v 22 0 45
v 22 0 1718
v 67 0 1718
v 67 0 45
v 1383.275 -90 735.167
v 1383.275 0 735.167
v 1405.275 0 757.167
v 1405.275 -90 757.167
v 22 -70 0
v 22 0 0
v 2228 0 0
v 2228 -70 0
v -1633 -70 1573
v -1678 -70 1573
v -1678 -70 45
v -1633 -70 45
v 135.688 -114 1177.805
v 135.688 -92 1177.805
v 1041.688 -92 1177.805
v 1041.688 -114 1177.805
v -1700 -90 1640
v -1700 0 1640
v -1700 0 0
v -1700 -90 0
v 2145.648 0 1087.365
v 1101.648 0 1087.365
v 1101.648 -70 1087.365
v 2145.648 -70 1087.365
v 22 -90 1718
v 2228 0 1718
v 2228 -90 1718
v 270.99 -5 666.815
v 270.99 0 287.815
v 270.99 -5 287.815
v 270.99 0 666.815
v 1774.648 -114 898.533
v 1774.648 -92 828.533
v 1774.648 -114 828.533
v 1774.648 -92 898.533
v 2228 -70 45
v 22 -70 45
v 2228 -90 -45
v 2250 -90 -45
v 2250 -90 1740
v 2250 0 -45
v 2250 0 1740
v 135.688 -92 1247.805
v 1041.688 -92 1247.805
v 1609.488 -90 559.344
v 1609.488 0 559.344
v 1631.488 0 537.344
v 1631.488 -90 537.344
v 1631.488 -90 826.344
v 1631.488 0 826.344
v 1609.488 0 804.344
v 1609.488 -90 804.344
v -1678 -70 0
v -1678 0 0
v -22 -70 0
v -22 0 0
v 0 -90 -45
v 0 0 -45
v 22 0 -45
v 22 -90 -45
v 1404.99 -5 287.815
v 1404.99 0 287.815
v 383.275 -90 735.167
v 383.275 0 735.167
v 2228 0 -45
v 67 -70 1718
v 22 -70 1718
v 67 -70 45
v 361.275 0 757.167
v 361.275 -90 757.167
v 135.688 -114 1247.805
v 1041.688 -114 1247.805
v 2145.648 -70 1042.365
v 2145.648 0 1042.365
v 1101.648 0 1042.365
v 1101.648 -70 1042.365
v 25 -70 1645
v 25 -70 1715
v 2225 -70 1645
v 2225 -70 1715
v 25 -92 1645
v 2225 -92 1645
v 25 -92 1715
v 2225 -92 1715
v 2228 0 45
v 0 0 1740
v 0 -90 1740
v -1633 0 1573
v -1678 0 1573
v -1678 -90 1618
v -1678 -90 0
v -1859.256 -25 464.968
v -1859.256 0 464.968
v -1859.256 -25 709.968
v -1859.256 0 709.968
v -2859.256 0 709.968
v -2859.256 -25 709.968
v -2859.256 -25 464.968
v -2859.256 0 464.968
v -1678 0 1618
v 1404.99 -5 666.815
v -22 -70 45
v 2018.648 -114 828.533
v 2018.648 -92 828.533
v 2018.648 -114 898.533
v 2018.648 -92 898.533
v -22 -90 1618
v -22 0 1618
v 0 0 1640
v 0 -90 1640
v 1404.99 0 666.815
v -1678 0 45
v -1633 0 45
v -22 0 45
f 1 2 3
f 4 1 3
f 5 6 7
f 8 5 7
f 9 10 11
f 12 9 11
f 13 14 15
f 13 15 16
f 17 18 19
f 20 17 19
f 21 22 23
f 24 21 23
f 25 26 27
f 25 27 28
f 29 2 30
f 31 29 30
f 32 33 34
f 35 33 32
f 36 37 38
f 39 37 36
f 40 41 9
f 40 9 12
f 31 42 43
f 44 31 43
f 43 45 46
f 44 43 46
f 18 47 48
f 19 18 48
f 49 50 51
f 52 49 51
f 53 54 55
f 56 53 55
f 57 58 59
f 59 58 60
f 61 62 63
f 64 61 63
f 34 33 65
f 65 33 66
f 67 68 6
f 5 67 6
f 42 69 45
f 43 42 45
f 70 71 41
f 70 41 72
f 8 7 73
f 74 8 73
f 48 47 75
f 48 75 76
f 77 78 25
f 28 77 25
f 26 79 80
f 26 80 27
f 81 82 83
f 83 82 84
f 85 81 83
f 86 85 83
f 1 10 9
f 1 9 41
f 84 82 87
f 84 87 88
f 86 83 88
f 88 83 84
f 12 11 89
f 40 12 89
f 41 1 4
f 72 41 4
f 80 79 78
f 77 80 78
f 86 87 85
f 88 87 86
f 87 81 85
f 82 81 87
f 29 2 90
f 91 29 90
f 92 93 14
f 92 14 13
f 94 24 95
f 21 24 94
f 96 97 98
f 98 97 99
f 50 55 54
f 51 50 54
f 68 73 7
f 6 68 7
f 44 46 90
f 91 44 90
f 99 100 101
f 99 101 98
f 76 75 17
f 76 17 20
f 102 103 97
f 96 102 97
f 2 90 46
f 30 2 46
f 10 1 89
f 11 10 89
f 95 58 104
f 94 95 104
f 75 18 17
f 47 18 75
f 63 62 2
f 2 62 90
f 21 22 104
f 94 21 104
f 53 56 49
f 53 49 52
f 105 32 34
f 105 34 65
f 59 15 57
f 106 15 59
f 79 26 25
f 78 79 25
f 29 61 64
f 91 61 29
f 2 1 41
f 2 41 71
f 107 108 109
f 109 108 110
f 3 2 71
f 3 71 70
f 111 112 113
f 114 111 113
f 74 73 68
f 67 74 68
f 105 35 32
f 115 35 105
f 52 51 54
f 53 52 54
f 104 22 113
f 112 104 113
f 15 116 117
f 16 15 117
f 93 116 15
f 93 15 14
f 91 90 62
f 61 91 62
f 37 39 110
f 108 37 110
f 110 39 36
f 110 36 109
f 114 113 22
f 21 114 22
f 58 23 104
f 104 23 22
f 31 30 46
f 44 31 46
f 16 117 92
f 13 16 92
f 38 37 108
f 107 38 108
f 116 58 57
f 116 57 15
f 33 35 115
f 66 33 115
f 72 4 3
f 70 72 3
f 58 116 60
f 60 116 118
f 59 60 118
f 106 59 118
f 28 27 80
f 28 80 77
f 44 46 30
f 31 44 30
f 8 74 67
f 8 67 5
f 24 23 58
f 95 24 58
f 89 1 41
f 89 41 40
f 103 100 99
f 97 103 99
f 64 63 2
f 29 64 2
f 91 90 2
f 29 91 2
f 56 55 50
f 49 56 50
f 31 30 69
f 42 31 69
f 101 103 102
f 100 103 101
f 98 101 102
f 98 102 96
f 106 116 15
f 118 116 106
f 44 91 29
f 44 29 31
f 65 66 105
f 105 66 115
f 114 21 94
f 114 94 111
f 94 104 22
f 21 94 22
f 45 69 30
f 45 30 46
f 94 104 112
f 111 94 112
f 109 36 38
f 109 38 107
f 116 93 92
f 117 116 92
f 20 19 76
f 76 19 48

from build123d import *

# Parameters (mm, degrees)
F1_W      = 2206
F1_H      = 45
F2_DEPTH  = 70
F3_W      = 45
F3_H      = 1673
F4_DEPTH  = 70
F6_DEPTH  = 90
F8_DEPTH  = 90
F10_DEPTH = 90
F11_W     = 2200
F11_H     = 70
F12_DEPTH = 22
F13_W     = 1044
F13_H     = 45
F14_DEPTH = 70
F15_W     = 906
F15_H     = 70
F16_DEPTH = 22
F17_W     = 244
F17_H     = 70
F18_DEPTH = 22
F20_DEPTH = 90
F22_DEPTH = 90
F23_W     = 1134
F23_H     = 379
F24_DEPTH = 5
F25_W     = 1000
F25_H     = 245
F26_DEPTH = 25
F27_W     = 1656
F27_H     = 45
F28_DEPTH = 70
F29_W     = 45
F29_H     = 1528
F30_DEPTH = 70
F32_DEPTH = 90
F34_DEPTH = 90


with BuildPart() as f2:
    # F1 (on face) → F2 (new body)
    with BuildSketch(Plane.XZ):
        with Locations((1125, 22.5)):
            Rectangle(F1_W, F1_H)
    extrude(amount=F2_DEPTH)


with BuildPart() as f4:
    # F3 (on face) → F4 (new body)
    with BuildSketch(Plane.XZ):
        with Locations((44.5, 881.5)):
            Rectangle(F3_W, F3_H)
    extrude(amount=F4_DEPTH)


with BuildPart() as f6:
    # F5 (on face) → F6 (new body)
    with BuildSketch(Plane.XZ):
        Polygon((2250, 1740), (0, 1740), (22, 1718), (2228, 1718), align=None)
    extrude(amount=F6_DEPTH)


with BuildPart() as f8:
    # F7 (on face) → F8 (new body)
    with BuildSketch(Plane.XZ):
        Polygon((2250, -45), (2250, 1740), (2228, 1718), (2228, -45), align=None)
    extrude(amount=F8_DEPTH)


with BuildPart() as f10:
    # F9 (on face) → F10 (new body)
    with BuildSketch(Plane.XZ):
        Polygon((22, 1718), (0, 1740), (0, -45), (22, -45), align=None)
    extrude(amount=F10_DEPTH)


with BuildPart() as f12:
    # F11 (on face) → F12 (new body)
    with BuildSketch(Plane.XZ.offset(70)):
        with Locations((1125, 1680)):
            Rectangle(F11_W, F11_H)
    extrude(amount=F12_DEPTH)


with BuildPart() as f14:
    # F13 (on face) → F14 (new body)
    with BuildSketch(Plane.XZ):
        with Locations((1623.64778, 1064.865232)):
            Rectangle(F13_W, F13_H)
    extrude(amount=F14_DEPTH)


with BuildPart() as f16:
    # F15 (on face) → F16 (new body)
    with BuildSketch(Plane.XZ.offset(92)):
        with Locations((588.688204, 1212.805476)):
            Rectangle(F15_W, F15_H)
    extrude(amount=F16_DEPTH)


with BuildPart() as f18:
    # F17 (on face) → F18 (new body)
    with BuildSketch(Plane.XZ.offset(92)):
        with Locations((1896.647818, 863.533348)):
            Rectangle(F17_W, F17_H)
    extrude(amount=F18_DEPTH)


with BuildPart() as f20:
    # F19 (on face) → F20 (new body)
    with BuildSketch(Plane.XZ):
        Polygon((1631.487687, 537.344146), (1631.487687, 826.344146), (1609.487687, 804.344146), (1609.487687, 559.344146), align=None)
    extrude(amount=F20_DEPTH)


with BuildPart() as f22:
    # F21 (on face) → F22 (new body)
    with BuildSketch(Plane.XZ):
        Polygon((1405.275234, 757.167445), (361.275234, 757.167445), (383.275234, 735.167445), (1383.275234, 735.167445), align=None)
    extrude(amount=F22_DEPTH)


with BuildPart() as f24:
    # F23 (on face) → F24 (new body)
    with BuildSketch(Plane.XZ):
        with Locations((837.989956, 477.315173)):
            Rectangle(F23_W, F23_H)
    extrude(amount=F24_DEPTH)


with BuildPart() as f26:
    # F25 (on face) → F26 (new body)
    with BuildSketch(Plane.XZ):
        with Locations((-2359.25585, 587.467998)):
            Rectangle(F25_W, F25_H)
    extrude(amount=F26_DEPTH)


with BuildPart() as f28:
    # F27 (on face) → F28 (new body)
    with BuildSketch(Plane.XZ):
        with Locations((-850, 22.5)):
            Rectangle(F27_W, F27_H)
    extrude(amount=F28_DEPTH)


with BuildPart() as f30:
    # F29 (on face) → F30 (new body)
    with BuildSketch(Plane.XZ):
        with Locations((-1655.5, 809)):
            Rectangle(F29_W, F29_H)
    extrude(amount=F30_DEPTH)


with BuildPart() as f32:
    # F31 (on face) → F32 (new body)
    with BuildSketch(Plane.XZ):
        Polygon((-1678, 1618), (-1700, 1640), (-1700, 0), (-1678, 0), align=None)
    extrude(amount=F32_DEPTH)


with BuildPart() as f34:
    # F33 (on face) → F34 (new body)
    with BuildSketch(Plane.XZ):
        Polygon((0, 1640), (-1700, 1640), (-1678, 1618), (-22, 1618), align=None)
    extrude(amount=F34_DEPTH)


solid = Compound([f2.part, f4.part, f6.part, f8.part, f10.part, f12.part, f14.part, f16.part, f18.part, f20.part, f22.part, f24.part, f26.part, f28.part, f30.part, f32.part, f34.part])
